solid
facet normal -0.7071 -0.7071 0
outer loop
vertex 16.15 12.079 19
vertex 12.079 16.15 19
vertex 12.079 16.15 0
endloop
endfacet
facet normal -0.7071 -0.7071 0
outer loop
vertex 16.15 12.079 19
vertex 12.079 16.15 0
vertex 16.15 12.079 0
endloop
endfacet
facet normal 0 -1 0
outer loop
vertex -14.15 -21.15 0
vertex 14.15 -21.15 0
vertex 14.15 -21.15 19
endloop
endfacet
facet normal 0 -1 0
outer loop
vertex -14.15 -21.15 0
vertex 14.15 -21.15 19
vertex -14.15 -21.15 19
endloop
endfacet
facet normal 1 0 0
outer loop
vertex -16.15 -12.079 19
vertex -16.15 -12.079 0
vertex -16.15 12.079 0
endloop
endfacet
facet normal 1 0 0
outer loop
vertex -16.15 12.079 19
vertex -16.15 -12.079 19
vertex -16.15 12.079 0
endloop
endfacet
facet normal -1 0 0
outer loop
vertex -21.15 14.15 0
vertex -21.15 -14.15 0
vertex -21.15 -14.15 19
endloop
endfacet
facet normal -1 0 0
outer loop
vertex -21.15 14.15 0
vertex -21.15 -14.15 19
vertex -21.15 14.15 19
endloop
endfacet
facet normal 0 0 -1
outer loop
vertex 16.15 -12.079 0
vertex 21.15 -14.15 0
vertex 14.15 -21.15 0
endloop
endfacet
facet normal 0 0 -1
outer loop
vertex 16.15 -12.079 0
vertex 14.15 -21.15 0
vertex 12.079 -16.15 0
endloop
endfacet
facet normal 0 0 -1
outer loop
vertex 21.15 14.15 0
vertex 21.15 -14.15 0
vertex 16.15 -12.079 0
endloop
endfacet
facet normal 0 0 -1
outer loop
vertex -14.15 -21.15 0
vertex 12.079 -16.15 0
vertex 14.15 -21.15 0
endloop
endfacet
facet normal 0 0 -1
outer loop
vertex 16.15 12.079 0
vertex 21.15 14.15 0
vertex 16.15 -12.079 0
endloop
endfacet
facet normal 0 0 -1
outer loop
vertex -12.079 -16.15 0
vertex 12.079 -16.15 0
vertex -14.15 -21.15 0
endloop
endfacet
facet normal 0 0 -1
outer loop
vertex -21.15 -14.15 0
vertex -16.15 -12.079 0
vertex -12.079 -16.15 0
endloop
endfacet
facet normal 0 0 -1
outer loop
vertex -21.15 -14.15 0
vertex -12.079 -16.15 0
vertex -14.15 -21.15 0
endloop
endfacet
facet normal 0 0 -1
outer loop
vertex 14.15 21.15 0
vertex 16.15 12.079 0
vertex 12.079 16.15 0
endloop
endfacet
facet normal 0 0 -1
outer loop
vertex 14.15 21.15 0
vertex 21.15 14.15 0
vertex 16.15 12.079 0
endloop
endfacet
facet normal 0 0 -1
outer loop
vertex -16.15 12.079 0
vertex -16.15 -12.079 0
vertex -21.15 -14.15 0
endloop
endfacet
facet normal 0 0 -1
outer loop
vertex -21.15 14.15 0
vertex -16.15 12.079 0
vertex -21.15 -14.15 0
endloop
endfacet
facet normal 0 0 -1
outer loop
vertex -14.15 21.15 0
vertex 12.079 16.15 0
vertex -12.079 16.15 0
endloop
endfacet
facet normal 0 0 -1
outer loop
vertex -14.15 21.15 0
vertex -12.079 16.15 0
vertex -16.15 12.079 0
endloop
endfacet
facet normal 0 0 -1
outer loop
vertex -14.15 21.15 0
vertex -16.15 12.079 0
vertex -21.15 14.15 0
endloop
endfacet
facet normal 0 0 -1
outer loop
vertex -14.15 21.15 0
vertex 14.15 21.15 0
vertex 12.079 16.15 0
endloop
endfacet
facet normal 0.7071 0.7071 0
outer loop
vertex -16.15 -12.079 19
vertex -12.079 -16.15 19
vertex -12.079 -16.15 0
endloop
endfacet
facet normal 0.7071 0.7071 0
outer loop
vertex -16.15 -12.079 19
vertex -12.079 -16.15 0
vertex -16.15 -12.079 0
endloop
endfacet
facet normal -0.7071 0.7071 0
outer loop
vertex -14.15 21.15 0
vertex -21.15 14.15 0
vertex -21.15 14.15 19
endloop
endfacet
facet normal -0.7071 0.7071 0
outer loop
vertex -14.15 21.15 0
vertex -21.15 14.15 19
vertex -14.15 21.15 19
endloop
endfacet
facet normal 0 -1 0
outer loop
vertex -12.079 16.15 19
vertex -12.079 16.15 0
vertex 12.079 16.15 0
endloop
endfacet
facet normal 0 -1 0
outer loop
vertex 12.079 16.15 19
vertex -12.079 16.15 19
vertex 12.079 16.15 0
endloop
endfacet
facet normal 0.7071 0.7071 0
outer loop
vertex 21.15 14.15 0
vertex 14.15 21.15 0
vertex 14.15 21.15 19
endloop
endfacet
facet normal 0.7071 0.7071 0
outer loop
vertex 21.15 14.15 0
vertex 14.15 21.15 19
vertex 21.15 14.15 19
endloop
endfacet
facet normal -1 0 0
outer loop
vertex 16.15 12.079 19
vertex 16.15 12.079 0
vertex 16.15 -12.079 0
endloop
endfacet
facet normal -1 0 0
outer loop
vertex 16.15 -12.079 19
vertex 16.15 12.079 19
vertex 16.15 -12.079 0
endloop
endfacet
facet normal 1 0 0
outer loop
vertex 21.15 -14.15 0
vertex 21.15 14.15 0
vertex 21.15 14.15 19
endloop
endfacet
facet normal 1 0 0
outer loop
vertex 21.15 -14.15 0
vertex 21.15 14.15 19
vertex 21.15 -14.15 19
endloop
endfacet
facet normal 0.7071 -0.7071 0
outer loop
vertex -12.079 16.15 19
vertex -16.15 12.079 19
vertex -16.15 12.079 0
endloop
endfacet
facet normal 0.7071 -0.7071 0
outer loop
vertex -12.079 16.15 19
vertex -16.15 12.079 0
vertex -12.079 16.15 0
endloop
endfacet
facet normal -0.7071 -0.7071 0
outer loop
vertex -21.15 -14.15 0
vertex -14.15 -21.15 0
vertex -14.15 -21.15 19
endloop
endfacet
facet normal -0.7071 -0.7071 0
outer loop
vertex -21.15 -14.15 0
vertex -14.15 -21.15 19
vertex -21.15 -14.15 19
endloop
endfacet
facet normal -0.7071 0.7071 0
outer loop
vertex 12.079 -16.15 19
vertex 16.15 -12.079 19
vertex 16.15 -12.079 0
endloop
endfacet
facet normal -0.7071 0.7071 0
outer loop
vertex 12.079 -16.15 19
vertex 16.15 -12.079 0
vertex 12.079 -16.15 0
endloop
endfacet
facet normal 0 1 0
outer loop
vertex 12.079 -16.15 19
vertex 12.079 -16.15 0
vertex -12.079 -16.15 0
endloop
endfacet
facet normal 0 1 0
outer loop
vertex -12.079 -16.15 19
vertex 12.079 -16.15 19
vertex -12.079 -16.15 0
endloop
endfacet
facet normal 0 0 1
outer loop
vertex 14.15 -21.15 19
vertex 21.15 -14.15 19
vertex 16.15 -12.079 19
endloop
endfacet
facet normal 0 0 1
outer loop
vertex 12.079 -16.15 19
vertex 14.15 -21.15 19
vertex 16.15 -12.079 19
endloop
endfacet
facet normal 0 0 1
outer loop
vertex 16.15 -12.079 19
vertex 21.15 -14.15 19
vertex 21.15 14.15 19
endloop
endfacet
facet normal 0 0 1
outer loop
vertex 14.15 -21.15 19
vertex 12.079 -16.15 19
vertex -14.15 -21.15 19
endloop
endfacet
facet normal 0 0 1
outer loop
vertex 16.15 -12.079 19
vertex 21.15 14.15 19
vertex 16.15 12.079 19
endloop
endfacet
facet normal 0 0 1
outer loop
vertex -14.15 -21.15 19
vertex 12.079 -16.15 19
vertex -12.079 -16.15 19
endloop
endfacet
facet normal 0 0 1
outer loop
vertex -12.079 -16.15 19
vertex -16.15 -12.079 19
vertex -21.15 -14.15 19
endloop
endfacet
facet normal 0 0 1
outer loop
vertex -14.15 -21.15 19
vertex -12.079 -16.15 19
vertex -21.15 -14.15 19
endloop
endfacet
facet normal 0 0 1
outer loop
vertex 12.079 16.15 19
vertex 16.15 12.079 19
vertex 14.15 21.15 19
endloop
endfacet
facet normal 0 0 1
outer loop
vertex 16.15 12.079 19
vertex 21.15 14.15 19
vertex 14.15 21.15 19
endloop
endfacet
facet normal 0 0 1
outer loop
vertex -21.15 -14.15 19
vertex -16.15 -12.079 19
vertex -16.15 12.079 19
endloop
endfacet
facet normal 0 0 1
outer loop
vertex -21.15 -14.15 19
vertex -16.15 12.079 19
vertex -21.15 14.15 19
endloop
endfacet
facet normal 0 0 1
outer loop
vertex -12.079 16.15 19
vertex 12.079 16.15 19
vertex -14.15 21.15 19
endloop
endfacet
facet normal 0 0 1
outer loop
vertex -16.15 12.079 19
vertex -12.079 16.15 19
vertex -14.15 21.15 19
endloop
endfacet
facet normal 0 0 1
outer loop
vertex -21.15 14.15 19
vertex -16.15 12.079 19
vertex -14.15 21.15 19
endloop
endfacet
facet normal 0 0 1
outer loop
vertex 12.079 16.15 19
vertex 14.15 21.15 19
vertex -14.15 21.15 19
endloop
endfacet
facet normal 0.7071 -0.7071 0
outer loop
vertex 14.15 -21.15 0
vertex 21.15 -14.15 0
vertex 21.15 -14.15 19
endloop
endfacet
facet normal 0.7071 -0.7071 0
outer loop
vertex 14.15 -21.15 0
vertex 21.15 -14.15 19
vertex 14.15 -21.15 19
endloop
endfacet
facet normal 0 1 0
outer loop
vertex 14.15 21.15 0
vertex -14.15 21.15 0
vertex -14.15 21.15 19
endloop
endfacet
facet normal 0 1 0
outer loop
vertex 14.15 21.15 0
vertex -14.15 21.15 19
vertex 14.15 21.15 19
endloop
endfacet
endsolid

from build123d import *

# Parameters (mm, degrees)
BOSS_EXTRUDE1_DEPTH = 19


with BuildPart() as part:
    # Sketch1 → Boss-Extrude1 (new body)
    with BuildSketch(Plane.XY):
        Polygon((-21.15, 14.15), (-14.15, 21.15), (14.15, 21.15), (21.15, 14.15), (21.15, -14.15), (14.15, -21.15), (-14.15, -21.15), (-21.15, -14.15), align=None)
        Polygon((-12.078932188, 16.15), (12.078932188, 16.15), (16.15, 12.078932188), (16.15, -12.078932188), (12.078932188, -16.15), (-12.078932188, -16.15), (-16.15, -12.078932188), (-16.15, 12.078932188), align=None, mode=Mode.SUBTRACT)
    extrude(amount=BOSS_EXTRUDE1_DEPTH)


solid = part.part
